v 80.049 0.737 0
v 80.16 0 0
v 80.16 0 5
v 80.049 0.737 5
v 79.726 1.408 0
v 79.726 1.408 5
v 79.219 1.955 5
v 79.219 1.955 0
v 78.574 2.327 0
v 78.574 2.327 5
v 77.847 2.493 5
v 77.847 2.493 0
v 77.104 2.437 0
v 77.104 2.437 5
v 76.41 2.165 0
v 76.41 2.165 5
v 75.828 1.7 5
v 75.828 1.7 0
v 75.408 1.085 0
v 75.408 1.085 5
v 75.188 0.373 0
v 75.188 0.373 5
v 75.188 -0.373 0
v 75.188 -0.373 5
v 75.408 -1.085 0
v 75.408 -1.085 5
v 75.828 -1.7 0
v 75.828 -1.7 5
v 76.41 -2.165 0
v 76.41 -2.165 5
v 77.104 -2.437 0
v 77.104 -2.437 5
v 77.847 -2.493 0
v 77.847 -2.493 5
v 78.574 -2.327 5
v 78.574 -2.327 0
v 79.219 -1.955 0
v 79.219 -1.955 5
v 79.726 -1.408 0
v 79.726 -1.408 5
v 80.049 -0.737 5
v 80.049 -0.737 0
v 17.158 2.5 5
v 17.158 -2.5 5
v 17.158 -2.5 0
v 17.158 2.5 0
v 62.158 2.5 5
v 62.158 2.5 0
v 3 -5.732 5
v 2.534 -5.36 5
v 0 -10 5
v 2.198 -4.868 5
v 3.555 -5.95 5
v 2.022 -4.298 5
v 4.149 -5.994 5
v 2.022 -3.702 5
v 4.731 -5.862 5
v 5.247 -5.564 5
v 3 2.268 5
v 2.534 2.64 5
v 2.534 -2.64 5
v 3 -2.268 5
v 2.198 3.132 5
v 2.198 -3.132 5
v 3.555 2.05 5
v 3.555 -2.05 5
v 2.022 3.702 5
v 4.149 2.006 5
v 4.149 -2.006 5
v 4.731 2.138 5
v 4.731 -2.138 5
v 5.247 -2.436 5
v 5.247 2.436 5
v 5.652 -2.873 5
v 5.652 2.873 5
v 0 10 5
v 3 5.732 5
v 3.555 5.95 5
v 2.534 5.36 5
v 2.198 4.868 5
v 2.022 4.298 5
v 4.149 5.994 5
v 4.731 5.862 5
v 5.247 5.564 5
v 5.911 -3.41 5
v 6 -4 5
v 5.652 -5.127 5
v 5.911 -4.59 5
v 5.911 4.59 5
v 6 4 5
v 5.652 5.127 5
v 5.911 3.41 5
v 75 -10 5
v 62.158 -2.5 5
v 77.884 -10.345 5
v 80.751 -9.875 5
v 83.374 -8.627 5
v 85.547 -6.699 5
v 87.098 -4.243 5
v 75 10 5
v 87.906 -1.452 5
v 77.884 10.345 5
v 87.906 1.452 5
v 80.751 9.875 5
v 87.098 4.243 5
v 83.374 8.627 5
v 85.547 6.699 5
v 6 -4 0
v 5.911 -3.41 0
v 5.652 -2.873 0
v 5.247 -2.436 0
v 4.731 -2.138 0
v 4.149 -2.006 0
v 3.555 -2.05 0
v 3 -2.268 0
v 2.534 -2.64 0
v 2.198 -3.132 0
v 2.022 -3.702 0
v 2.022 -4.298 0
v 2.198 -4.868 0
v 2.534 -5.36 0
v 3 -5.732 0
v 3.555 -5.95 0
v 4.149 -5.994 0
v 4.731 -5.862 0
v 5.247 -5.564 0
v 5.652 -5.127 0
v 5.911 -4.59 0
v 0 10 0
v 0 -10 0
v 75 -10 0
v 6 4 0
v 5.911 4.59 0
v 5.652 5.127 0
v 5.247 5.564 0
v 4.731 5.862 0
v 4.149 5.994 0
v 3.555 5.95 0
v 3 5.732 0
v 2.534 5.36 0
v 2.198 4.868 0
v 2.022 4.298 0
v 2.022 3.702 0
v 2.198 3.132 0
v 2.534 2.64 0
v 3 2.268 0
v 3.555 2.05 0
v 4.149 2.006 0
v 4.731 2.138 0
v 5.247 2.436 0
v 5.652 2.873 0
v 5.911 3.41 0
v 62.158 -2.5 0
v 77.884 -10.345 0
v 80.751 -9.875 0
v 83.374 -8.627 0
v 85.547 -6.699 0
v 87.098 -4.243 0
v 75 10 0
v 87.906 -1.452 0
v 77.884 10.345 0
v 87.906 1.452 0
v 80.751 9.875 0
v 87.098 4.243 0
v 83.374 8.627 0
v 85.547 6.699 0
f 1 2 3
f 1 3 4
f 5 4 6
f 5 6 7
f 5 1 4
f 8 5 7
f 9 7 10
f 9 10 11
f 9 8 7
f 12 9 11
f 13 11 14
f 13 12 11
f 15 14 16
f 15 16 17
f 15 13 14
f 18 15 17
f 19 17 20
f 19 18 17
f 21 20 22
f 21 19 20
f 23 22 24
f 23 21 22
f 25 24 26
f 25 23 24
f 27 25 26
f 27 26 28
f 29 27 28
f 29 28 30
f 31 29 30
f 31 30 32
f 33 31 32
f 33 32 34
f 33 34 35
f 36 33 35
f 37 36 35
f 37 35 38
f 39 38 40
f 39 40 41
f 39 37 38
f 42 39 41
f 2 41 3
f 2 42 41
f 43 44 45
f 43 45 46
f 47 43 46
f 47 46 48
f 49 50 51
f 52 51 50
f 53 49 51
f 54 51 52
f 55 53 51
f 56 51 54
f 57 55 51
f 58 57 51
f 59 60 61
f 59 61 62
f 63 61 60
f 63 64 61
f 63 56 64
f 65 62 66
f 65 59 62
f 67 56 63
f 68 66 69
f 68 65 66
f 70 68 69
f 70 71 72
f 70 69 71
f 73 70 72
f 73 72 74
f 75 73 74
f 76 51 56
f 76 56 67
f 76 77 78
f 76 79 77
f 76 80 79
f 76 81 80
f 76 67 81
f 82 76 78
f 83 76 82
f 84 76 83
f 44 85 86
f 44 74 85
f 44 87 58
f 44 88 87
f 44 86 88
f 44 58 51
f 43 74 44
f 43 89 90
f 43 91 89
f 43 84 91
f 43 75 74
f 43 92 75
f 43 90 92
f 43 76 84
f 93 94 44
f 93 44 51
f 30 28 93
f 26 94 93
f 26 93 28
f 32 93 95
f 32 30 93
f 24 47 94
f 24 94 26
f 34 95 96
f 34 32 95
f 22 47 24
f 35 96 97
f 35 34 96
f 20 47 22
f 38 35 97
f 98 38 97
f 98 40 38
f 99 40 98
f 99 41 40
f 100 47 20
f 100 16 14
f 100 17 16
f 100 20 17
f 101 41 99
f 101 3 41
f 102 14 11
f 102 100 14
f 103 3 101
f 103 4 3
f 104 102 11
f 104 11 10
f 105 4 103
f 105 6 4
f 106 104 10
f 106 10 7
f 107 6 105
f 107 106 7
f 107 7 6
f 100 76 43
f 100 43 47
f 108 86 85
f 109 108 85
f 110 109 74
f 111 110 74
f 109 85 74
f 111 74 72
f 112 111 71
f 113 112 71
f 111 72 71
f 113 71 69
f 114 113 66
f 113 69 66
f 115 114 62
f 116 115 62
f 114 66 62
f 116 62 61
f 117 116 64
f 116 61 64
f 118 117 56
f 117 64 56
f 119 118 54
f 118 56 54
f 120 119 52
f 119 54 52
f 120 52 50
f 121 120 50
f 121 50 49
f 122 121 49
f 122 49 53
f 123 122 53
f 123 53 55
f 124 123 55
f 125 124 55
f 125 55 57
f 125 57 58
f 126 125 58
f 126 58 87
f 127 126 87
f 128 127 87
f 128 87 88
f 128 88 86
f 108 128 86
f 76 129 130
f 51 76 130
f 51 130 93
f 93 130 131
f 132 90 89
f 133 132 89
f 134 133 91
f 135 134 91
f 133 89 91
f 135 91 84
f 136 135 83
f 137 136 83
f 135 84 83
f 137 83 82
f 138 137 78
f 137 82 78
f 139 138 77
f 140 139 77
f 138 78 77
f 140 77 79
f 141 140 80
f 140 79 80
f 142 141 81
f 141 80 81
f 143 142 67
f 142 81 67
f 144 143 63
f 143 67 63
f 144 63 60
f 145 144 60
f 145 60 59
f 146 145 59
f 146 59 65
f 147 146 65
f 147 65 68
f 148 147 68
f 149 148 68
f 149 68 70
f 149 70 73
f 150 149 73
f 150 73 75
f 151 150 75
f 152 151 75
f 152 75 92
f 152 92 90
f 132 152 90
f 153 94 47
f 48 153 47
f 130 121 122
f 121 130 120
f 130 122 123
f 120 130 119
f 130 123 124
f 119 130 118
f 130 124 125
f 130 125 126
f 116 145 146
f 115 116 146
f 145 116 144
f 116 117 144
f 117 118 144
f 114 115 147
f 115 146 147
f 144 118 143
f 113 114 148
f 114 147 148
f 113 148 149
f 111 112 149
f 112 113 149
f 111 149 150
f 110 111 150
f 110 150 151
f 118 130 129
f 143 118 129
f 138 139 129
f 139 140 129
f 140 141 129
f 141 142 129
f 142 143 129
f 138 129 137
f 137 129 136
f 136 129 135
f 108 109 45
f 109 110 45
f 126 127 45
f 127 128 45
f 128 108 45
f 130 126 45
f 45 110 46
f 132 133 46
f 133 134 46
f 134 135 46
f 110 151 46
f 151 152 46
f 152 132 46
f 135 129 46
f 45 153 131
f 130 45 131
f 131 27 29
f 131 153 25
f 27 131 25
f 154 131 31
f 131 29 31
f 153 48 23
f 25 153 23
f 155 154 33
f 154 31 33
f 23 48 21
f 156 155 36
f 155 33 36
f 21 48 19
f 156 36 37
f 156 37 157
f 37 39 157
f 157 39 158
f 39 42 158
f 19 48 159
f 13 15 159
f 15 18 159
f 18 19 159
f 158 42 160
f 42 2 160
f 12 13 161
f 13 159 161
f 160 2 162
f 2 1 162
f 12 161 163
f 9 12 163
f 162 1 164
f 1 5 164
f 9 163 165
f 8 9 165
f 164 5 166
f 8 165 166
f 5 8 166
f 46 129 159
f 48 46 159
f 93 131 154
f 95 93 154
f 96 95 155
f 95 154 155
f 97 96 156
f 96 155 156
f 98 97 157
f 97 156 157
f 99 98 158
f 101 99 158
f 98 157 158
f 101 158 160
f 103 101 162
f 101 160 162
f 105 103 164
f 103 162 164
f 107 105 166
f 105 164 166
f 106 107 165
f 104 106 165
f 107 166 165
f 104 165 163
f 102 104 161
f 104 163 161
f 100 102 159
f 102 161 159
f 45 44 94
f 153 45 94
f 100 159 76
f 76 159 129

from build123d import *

# Parameters (mm, degrees)
SCHIZZO1_R                   = 2.5
ESTRUSIONE_ESTRUSIONE1_DEPTH = 5
SCHIZZO2_W                   = 45
SCHIZZO2_H                   = 5
TAGLIO_ESTRUSIONE1_DEPTH     = 89.755250064
SCHIZZO4_R                   = 2
TAGLIO_ESTRUSIONE2_DEPTH     = 89.755250064


with BuildPart() as part:
    # Schizzo1 → Estrusione-Estrusione1 (new body)
    with BuildSketch(Plane.XY):
        with BuildLine():
            Line((0, -10), (75, -10))
            ThreePointArc((75, -10), (88.008053395, 0), (75, 10))
            Line((75, 10), (0, 10))
            Line((0, 10), (0, -10))
        make_face()
        with Locations((77.660254038, 0)):
            Circle(SCHIZZO1_R, mode=Mode.SUBTRACT)
    extrude(amount=ESTRUSIONE_ESTRUSIONE1_DEPTH)

    # Schizzo2 → Taglio-Estrusione1 (cut, through all)
    with BuildSketch(Plane.XY.offset(5)):
        with Locations((39.658388278, 0)):
            Rectangle(SCHIZZO2_W, SCHIZZO2_H)
    extrude(amount=-TAGLIO_ESTRUSIONE1_DEPTH, mode=Mode.SUBTRACT)

    # Schizzo4 → Taglio-Estrusione2 (cut, through all)
    with BuildSketch(Plane.XY.offset(5)):
        with Locations((4, 4)):
            Circle(SCHIZZO4_R)
        with Locations((4, -4)):
            Circle(SCHIZZO4_R)
    extrude(amount=-TAGLIO_ESTRUSIONE2_DEPTH, mode=Mode.SUBTRACT)


solid = part.part
